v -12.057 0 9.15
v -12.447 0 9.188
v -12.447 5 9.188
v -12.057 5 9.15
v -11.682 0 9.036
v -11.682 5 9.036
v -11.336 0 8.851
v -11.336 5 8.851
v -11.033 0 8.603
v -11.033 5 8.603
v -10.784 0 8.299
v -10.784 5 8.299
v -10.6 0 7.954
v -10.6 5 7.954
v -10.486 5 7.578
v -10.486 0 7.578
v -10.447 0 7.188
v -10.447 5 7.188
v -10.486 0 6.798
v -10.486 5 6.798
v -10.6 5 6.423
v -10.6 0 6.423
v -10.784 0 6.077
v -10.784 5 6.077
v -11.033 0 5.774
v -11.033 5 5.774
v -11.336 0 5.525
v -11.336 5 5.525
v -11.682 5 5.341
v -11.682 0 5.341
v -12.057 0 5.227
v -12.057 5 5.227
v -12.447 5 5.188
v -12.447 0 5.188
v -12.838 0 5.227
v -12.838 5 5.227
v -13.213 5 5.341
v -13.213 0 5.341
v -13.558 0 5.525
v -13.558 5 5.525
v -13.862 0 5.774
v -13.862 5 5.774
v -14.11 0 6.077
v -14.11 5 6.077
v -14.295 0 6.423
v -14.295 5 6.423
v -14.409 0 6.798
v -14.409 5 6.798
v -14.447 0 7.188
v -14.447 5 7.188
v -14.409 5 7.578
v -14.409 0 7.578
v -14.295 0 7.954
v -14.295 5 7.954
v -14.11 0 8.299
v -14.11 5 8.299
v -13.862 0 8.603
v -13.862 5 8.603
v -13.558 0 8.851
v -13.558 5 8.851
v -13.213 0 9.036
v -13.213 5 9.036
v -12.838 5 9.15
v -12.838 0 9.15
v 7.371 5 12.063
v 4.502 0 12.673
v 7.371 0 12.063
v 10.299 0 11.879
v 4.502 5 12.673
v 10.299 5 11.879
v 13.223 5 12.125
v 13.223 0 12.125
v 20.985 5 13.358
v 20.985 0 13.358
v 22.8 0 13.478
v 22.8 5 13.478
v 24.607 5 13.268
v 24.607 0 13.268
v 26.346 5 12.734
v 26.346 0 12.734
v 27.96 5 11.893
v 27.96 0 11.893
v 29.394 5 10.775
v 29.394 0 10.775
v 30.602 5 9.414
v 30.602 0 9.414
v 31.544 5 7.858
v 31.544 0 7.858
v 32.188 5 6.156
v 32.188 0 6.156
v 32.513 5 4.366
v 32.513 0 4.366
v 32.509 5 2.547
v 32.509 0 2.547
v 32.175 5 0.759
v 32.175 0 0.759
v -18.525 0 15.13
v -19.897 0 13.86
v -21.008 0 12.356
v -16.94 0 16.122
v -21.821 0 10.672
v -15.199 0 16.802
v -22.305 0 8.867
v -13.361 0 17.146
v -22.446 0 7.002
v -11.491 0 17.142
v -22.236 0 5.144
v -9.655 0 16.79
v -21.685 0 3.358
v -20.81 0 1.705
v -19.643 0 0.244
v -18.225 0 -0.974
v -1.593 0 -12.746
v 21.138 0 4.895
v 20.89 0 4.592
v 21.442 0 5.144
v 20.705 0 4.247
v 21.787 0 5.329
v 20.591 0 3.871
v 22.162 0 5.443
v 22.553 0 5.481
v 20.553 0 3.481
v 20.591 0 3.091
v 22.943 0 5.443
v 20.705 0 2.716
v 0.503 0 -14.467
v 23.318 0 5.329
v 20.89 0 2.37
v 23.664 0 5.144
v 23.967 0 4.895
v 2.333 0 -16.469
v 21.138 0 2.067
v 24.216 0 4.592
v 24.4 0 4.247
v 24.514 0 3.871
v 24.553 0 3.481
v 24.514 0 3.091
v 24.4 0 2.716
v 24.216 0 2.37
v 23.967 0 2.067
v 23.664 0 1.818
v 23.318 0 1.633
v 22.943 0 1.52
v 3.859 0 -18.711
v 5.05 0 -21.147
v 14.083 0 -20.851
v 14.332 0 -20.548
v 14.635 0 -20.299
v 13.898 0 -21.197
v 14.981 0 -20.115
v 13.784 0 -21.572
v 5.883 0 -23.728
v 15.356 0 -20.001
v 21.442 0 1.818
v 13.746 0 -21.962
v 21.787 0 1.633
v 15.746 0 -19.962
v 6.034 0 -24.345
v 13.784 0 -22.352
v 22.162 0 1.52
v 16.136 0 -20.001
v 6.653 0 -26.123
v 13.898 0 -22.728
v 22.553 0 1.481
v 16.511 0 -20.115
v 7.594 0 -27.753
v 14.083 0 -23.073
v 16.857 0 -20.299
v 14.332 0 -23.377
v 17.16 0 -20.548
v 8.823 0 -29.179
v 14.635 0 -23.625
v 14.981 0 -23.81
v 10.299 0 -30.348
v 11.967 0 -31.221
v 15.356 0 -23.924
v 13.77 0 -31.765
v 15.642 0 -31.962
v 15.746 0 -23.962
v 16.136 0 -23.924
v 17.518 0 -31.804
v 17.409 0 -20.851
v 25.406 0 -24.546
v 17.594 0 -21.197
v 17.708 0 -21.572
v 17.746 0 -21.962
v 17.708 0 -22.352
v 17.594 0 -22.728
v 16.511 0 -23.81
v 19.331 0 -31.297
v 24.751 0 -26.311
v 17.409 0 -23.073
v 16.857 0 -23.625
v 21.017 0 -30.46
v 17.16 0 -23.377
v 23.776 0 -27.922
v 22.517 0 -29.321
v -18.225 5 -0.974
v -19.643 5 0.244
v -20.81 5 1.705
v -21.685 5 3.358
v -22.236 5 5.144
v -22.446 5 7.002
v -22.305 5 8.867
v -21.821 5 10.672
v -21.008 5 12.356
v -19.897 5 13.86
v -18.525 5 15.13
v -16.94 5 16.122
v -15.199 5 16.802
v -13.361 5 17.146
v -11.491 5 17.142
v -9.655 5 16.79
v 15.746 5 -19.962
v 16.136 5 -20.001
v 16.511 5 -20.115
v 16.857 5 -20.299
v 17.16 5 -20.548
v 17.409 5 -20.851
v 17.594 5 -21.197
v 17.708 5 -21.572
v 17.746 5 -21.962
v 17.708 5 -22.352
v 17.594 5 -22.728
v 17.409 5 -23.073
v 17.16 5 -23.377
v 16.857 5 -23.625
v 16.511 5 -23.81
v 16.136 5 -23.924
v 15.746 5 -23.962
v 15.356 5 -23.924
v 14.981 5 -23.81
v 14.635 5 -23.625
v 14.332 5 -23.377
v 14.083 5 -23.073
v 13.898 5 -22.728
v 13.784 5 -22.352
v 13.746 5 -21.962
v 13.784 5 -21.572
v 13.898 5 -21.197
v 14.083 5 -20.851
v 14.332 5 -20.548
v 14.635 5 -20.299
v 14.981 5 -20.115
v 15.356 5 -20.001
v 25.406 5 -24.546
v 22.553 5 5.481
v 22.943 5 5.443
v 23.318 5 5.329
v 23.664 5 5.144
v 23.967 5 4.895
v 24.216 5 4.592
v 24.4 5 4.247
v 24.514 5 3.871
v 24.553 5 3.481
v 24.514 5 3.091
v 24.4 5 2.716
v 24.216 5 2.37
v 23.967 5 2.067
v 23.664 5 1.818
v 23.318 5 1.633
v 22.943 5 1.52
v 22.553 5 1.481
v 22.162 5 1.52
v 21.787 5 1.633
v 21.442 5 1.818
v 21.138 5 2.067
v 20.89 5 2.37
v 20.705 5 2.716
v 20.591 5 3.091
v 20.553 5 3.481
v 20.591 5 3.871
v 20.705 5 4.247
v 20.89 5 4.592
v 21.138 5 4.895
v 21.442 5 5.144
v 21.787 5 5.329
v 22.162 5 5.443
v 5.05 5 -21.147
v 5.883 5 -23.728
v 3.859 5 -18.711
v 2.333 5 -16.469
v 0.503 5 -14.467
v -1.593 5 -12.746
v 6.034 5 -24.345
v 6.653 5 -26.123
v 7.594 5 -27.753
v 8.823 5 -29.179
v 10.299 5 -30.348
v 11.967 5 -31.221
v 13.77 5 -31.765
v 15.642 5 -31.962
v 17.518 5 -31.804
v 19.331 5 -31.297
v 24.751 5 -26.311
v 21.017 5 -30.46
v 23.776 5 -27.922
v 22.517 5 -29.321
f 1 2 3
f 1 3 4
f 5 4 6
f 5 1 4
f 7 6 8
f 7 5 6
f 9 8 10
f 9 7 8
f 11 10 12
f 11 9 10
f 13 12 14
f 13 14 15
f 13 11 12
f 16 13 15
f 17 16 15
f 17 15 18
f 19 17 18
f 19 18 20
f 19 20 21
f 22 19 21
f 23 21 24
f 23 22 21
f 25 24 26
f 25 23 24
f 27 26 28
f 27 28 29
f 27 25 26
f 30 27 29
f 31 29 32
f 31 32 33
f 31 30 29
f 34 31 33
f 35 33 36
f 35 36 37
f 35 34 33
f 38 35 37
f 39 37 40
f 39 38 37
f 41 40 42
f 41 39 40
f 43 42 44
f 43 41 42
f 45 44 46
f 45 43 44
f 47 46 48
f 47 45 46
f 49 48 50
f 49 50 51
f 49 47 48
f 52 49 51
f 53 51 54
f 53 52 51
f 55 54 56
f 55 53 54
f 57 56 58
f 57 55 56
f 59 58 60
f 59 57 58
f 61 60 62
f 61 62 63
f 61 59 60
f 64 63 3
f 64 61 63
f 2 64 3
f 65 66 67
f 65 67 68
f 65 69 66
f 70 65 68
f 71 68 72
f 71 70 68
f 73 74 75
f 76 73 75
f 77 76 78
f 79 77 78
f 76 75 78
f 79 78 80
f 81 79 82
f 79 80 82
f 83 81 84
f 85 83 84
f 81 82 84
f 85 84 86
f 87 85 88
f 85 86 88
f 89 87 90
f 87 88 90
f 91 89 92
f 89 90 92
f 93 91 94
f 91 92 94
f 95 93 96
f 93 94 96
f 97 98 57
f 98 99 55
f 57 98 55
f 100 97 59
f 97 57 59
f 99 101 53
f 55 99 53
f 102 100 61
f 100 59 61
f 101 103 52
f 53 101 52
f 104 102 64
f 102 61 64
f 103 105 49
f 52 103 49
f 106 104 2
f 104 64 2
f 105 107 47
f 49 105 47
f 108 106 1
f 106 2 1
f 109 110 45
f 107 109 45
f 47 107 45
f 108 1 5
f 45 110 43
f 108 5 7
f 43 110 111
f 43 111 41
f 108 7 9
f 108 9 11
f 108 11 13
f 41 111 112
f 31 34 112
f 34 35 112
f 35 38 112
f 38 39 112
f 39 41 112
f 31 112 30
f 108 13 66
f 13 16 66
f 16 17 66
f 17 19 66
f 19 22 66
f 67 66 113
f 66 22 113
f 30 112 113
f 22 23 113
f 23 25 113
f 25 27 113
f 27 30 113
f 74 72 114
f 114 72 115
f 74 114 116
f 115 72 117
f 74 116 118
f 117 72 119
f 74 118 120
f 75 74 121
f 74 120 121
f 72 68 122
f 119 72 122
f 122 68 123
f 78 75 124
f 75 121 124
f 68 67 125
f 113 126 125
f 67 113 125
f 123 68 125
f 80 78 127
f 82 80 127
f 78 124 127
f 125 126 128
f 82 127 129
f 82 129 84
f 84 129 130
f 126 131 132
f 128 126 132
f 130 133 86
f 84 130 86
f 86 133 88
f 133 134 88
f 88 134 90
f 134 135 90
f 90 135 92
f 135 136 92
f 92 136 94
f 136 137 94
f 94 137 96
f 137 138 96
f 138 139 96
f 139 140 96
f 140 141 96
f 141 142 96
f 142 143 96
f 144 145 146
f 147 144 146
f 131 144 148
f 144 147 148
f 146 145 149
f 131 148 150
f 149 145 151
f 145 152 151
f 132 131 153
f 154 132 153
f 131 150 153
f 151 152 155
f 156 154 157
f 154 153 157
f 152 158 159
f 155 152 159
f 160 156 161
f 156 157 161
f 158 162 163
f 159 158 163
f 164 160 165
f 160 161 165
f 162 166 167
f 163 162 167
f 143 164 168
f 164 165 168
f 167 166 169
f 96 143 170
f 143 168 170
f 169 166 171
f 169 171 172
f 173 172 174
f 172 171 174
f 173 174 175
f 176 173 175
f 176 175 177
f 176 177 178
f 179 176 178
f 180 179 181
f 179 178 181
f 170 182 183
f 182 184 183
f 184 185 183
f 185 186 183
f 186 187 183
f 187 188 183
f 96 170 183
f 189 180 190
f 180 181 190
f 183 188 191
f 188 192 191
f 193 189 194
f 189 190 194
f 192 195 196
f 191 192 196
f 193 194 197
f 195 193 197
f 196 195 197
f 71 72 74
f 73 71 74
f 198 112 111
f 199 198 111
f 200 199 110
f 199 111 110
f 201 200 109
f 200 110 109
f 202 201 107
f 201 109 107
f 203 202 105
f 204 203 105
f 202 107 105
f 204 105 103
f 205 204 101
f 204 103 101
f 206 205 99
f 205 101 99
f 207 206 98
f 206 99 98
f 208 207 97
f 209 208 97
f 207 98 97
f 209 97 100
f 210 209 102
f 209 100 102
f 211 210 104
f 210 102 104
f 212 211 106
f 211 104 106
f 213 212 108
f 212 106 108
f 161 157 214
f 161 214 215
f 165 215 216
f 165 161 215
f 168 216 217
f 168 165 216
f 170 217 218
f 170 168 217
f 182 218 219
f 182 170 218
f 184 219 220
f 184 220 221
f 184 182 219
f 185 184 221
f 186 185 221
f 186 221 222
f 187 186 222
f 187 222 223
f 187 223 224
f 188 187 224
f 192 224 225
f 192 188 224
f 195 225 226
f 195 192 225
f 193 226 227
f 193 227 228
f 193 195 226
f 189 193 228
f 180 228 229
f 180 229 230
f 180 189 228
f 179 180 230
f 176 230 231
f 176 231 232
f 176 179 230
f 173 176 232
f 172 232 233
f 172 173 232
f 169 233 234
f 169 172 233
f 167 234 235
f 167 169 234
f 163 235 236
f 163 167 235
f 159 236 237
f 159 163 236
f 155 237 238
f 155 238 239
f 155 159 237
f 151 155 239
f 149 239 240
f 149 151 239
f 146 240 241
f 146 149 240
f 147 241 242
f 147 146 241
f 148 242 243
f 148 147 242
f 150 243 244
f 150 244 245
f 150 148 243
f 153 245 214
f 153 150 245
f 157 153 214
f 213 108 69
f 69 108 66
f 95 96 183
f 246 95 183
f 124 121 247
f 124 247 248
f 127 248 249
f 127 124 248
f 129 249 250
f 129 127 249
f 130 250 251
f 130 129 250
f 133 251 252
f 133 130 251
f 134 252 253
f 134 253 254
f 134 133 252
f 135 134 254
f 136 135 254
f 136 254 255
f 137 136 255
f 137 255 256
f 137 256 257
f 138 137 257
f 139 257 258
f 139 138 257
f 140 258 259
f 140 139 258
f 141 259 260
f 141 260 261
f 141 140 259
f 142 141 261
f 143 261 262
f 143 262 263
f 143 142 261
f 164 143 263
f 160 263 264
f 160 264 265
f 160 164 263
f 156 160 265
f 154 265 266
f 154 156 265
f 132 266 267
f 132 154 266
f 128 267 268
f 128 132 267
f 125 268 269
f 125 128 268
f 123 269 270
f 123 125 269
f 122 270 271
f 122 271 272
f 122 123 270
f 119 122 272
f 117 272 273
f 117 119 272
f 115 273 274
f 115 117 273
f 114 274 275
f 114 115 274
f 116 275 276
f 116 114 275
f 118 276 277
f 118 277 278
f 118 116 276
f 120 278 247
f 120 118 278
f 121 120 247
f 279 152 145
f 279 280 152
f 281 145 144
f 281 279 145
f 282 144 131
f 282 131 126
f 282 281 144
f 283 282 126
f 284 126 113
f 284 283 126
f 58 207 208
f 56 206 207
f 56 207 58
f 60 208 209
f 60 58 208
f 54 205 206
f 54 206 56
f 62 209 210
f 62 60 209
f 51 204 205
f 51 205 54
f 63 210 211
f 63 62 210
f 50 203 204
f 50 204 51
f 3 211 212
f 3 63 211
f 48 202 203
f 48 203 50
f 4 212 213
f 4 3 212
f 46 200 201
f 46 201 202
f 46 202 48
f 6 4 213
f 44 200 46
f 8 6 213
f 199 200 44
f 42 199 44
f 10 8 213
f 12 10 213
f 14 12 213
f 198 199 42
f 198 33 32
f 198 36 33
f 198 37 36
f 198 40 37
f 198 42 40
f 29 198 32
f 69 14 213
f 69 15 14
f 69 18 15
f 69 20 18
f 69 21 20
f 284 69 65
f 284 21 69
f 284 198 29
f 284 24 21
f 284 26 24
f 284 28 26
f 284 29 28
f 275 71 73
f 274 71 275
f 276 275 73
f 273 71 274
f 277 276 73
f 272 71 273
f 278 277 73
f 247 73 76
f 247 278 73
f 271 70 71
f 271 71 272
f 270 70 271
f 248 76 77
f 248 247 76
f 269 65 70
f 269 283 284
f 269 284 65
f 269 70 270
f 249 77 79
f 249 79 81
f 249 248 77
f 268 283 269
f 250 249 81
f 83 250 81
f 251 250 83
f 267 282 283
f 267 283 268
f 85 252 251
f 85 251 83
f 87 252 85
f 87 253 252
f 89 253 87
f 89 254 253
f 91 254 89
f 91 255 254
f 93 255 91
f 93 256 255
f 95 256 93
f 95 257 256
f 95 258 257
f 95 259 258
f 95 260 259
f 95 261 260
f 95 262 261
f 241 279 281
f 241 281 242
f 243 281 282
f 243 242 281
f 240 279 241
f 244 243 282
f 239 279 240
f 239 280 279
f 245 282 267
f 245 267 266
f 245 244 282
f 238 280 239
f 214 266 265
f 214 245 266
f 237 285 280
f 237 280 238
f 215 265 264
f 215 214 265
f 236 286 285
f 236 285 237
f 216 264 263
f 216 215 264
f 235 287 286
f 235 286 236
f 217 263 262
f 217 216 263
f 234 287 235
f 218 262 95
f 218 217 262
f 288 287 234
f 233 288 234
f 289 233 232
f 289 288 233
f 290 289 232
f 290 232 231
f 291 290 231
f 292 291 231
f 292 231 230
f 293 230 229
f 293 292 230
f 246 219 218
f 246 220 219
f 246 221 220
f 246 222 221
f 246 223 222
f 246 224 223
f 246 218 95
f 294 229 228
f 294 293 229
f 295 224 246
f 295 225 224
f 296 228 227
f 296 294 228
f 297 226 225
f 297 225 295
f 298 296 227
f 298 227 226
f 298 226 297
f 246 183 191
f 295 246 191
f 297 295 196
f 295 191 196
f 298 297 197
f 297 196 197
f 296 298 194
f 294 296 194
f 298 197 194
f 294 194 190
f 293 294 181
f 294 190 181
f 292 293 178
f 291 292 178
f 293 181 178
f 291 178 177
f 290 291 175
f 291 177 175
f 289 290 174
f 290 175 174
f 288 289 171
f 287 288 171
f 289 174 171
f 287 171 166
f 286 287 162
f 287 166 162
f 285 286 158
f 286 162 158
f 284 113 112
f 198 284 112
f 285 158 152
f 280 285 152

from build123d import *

# Parameters (mm, degrees)
SKIZZE1_R                       = 2
AUFSATZ_LINEAR_AUSTRAGEN1_DEPTH = 5
VERRUNDUNG1_R                   = 19
VERRUNDUNG2_R                   = 20


with BuildPart() as part:
    # Skizze1 → Aufsatz-Linear austragen1 (new body)
    with BuildSketch(Plane(origin=(0, 0, 0), x_dir=(1, 0, 0), z_dir=(0, 1, 0))):
        with BuildLine():
            Line((32.174930969, -0.758710751), (25.406405474, 24.546237926))
            ThreePointArc((25.406405474, 24.546237926), (15.641921228, 31.961749958), (6.033920269, 24.344579298))
            Line((6.033920269, 24.344579298), (4.193711044, 16.842429276))
            Line((4.193711044, 16.842429276), (-18.224781404, 0.973862232))
            ThreePointArc((-18.224781404, 0.973862232), (-21.454022597, -11.53334461), (-9.654845468, -16.790495999))
            Line((-9.654845468, -16.790495999), (8.801061186, -11.423209418))
            Line((8.801061186, -11.423209418), (20.984655174, -13.357550953))
            ThreePointArc((20.984655174, -13.357550953), (30.029331036, -10.12200662), (32.174930969, -0.758710751))
        make_face()
        with Locations(Location((22.552676727, -3.481250613, 0), (0, 0, 270))):
            Circle(SKIZZE1_R, mode=Mode.SUBTRACT)
        with Locations(Location((-12.447323273, -7.188305222, 0), (0, 0, 270))):
            Circle(SKIZZE1_R, mode=Mode.SUBTRACT)
        with Locations(Location((15.746010972, 21.962291706, 0), (0, 0, 270))):
            Circle(SKIZZE1_R, mode=Mode.SUBTRACT)
    extrude(amount=AUFSATZ_LINEAR_AUSTRAGEN1_DEPTH)

    # Verrundung1
    verrundung1_edges = [part.edges().sort_by_distance(p)[0] for p in [
        (4.193711044, 2.5, -16.842429276),
    ]]
    fillet(verrundung1_edges, radius=VERRUNDUNG1_R)

    # Verrundung2
    verrundung2_edges = [part.edges().sort_by_distance(p)[0] for p in [
        (8.801061186, 2.5, 11.423209418),
    ]]
    fillet(verrundung2_edges, radius=VERRUNDUNG2_R)


solid = part.part
